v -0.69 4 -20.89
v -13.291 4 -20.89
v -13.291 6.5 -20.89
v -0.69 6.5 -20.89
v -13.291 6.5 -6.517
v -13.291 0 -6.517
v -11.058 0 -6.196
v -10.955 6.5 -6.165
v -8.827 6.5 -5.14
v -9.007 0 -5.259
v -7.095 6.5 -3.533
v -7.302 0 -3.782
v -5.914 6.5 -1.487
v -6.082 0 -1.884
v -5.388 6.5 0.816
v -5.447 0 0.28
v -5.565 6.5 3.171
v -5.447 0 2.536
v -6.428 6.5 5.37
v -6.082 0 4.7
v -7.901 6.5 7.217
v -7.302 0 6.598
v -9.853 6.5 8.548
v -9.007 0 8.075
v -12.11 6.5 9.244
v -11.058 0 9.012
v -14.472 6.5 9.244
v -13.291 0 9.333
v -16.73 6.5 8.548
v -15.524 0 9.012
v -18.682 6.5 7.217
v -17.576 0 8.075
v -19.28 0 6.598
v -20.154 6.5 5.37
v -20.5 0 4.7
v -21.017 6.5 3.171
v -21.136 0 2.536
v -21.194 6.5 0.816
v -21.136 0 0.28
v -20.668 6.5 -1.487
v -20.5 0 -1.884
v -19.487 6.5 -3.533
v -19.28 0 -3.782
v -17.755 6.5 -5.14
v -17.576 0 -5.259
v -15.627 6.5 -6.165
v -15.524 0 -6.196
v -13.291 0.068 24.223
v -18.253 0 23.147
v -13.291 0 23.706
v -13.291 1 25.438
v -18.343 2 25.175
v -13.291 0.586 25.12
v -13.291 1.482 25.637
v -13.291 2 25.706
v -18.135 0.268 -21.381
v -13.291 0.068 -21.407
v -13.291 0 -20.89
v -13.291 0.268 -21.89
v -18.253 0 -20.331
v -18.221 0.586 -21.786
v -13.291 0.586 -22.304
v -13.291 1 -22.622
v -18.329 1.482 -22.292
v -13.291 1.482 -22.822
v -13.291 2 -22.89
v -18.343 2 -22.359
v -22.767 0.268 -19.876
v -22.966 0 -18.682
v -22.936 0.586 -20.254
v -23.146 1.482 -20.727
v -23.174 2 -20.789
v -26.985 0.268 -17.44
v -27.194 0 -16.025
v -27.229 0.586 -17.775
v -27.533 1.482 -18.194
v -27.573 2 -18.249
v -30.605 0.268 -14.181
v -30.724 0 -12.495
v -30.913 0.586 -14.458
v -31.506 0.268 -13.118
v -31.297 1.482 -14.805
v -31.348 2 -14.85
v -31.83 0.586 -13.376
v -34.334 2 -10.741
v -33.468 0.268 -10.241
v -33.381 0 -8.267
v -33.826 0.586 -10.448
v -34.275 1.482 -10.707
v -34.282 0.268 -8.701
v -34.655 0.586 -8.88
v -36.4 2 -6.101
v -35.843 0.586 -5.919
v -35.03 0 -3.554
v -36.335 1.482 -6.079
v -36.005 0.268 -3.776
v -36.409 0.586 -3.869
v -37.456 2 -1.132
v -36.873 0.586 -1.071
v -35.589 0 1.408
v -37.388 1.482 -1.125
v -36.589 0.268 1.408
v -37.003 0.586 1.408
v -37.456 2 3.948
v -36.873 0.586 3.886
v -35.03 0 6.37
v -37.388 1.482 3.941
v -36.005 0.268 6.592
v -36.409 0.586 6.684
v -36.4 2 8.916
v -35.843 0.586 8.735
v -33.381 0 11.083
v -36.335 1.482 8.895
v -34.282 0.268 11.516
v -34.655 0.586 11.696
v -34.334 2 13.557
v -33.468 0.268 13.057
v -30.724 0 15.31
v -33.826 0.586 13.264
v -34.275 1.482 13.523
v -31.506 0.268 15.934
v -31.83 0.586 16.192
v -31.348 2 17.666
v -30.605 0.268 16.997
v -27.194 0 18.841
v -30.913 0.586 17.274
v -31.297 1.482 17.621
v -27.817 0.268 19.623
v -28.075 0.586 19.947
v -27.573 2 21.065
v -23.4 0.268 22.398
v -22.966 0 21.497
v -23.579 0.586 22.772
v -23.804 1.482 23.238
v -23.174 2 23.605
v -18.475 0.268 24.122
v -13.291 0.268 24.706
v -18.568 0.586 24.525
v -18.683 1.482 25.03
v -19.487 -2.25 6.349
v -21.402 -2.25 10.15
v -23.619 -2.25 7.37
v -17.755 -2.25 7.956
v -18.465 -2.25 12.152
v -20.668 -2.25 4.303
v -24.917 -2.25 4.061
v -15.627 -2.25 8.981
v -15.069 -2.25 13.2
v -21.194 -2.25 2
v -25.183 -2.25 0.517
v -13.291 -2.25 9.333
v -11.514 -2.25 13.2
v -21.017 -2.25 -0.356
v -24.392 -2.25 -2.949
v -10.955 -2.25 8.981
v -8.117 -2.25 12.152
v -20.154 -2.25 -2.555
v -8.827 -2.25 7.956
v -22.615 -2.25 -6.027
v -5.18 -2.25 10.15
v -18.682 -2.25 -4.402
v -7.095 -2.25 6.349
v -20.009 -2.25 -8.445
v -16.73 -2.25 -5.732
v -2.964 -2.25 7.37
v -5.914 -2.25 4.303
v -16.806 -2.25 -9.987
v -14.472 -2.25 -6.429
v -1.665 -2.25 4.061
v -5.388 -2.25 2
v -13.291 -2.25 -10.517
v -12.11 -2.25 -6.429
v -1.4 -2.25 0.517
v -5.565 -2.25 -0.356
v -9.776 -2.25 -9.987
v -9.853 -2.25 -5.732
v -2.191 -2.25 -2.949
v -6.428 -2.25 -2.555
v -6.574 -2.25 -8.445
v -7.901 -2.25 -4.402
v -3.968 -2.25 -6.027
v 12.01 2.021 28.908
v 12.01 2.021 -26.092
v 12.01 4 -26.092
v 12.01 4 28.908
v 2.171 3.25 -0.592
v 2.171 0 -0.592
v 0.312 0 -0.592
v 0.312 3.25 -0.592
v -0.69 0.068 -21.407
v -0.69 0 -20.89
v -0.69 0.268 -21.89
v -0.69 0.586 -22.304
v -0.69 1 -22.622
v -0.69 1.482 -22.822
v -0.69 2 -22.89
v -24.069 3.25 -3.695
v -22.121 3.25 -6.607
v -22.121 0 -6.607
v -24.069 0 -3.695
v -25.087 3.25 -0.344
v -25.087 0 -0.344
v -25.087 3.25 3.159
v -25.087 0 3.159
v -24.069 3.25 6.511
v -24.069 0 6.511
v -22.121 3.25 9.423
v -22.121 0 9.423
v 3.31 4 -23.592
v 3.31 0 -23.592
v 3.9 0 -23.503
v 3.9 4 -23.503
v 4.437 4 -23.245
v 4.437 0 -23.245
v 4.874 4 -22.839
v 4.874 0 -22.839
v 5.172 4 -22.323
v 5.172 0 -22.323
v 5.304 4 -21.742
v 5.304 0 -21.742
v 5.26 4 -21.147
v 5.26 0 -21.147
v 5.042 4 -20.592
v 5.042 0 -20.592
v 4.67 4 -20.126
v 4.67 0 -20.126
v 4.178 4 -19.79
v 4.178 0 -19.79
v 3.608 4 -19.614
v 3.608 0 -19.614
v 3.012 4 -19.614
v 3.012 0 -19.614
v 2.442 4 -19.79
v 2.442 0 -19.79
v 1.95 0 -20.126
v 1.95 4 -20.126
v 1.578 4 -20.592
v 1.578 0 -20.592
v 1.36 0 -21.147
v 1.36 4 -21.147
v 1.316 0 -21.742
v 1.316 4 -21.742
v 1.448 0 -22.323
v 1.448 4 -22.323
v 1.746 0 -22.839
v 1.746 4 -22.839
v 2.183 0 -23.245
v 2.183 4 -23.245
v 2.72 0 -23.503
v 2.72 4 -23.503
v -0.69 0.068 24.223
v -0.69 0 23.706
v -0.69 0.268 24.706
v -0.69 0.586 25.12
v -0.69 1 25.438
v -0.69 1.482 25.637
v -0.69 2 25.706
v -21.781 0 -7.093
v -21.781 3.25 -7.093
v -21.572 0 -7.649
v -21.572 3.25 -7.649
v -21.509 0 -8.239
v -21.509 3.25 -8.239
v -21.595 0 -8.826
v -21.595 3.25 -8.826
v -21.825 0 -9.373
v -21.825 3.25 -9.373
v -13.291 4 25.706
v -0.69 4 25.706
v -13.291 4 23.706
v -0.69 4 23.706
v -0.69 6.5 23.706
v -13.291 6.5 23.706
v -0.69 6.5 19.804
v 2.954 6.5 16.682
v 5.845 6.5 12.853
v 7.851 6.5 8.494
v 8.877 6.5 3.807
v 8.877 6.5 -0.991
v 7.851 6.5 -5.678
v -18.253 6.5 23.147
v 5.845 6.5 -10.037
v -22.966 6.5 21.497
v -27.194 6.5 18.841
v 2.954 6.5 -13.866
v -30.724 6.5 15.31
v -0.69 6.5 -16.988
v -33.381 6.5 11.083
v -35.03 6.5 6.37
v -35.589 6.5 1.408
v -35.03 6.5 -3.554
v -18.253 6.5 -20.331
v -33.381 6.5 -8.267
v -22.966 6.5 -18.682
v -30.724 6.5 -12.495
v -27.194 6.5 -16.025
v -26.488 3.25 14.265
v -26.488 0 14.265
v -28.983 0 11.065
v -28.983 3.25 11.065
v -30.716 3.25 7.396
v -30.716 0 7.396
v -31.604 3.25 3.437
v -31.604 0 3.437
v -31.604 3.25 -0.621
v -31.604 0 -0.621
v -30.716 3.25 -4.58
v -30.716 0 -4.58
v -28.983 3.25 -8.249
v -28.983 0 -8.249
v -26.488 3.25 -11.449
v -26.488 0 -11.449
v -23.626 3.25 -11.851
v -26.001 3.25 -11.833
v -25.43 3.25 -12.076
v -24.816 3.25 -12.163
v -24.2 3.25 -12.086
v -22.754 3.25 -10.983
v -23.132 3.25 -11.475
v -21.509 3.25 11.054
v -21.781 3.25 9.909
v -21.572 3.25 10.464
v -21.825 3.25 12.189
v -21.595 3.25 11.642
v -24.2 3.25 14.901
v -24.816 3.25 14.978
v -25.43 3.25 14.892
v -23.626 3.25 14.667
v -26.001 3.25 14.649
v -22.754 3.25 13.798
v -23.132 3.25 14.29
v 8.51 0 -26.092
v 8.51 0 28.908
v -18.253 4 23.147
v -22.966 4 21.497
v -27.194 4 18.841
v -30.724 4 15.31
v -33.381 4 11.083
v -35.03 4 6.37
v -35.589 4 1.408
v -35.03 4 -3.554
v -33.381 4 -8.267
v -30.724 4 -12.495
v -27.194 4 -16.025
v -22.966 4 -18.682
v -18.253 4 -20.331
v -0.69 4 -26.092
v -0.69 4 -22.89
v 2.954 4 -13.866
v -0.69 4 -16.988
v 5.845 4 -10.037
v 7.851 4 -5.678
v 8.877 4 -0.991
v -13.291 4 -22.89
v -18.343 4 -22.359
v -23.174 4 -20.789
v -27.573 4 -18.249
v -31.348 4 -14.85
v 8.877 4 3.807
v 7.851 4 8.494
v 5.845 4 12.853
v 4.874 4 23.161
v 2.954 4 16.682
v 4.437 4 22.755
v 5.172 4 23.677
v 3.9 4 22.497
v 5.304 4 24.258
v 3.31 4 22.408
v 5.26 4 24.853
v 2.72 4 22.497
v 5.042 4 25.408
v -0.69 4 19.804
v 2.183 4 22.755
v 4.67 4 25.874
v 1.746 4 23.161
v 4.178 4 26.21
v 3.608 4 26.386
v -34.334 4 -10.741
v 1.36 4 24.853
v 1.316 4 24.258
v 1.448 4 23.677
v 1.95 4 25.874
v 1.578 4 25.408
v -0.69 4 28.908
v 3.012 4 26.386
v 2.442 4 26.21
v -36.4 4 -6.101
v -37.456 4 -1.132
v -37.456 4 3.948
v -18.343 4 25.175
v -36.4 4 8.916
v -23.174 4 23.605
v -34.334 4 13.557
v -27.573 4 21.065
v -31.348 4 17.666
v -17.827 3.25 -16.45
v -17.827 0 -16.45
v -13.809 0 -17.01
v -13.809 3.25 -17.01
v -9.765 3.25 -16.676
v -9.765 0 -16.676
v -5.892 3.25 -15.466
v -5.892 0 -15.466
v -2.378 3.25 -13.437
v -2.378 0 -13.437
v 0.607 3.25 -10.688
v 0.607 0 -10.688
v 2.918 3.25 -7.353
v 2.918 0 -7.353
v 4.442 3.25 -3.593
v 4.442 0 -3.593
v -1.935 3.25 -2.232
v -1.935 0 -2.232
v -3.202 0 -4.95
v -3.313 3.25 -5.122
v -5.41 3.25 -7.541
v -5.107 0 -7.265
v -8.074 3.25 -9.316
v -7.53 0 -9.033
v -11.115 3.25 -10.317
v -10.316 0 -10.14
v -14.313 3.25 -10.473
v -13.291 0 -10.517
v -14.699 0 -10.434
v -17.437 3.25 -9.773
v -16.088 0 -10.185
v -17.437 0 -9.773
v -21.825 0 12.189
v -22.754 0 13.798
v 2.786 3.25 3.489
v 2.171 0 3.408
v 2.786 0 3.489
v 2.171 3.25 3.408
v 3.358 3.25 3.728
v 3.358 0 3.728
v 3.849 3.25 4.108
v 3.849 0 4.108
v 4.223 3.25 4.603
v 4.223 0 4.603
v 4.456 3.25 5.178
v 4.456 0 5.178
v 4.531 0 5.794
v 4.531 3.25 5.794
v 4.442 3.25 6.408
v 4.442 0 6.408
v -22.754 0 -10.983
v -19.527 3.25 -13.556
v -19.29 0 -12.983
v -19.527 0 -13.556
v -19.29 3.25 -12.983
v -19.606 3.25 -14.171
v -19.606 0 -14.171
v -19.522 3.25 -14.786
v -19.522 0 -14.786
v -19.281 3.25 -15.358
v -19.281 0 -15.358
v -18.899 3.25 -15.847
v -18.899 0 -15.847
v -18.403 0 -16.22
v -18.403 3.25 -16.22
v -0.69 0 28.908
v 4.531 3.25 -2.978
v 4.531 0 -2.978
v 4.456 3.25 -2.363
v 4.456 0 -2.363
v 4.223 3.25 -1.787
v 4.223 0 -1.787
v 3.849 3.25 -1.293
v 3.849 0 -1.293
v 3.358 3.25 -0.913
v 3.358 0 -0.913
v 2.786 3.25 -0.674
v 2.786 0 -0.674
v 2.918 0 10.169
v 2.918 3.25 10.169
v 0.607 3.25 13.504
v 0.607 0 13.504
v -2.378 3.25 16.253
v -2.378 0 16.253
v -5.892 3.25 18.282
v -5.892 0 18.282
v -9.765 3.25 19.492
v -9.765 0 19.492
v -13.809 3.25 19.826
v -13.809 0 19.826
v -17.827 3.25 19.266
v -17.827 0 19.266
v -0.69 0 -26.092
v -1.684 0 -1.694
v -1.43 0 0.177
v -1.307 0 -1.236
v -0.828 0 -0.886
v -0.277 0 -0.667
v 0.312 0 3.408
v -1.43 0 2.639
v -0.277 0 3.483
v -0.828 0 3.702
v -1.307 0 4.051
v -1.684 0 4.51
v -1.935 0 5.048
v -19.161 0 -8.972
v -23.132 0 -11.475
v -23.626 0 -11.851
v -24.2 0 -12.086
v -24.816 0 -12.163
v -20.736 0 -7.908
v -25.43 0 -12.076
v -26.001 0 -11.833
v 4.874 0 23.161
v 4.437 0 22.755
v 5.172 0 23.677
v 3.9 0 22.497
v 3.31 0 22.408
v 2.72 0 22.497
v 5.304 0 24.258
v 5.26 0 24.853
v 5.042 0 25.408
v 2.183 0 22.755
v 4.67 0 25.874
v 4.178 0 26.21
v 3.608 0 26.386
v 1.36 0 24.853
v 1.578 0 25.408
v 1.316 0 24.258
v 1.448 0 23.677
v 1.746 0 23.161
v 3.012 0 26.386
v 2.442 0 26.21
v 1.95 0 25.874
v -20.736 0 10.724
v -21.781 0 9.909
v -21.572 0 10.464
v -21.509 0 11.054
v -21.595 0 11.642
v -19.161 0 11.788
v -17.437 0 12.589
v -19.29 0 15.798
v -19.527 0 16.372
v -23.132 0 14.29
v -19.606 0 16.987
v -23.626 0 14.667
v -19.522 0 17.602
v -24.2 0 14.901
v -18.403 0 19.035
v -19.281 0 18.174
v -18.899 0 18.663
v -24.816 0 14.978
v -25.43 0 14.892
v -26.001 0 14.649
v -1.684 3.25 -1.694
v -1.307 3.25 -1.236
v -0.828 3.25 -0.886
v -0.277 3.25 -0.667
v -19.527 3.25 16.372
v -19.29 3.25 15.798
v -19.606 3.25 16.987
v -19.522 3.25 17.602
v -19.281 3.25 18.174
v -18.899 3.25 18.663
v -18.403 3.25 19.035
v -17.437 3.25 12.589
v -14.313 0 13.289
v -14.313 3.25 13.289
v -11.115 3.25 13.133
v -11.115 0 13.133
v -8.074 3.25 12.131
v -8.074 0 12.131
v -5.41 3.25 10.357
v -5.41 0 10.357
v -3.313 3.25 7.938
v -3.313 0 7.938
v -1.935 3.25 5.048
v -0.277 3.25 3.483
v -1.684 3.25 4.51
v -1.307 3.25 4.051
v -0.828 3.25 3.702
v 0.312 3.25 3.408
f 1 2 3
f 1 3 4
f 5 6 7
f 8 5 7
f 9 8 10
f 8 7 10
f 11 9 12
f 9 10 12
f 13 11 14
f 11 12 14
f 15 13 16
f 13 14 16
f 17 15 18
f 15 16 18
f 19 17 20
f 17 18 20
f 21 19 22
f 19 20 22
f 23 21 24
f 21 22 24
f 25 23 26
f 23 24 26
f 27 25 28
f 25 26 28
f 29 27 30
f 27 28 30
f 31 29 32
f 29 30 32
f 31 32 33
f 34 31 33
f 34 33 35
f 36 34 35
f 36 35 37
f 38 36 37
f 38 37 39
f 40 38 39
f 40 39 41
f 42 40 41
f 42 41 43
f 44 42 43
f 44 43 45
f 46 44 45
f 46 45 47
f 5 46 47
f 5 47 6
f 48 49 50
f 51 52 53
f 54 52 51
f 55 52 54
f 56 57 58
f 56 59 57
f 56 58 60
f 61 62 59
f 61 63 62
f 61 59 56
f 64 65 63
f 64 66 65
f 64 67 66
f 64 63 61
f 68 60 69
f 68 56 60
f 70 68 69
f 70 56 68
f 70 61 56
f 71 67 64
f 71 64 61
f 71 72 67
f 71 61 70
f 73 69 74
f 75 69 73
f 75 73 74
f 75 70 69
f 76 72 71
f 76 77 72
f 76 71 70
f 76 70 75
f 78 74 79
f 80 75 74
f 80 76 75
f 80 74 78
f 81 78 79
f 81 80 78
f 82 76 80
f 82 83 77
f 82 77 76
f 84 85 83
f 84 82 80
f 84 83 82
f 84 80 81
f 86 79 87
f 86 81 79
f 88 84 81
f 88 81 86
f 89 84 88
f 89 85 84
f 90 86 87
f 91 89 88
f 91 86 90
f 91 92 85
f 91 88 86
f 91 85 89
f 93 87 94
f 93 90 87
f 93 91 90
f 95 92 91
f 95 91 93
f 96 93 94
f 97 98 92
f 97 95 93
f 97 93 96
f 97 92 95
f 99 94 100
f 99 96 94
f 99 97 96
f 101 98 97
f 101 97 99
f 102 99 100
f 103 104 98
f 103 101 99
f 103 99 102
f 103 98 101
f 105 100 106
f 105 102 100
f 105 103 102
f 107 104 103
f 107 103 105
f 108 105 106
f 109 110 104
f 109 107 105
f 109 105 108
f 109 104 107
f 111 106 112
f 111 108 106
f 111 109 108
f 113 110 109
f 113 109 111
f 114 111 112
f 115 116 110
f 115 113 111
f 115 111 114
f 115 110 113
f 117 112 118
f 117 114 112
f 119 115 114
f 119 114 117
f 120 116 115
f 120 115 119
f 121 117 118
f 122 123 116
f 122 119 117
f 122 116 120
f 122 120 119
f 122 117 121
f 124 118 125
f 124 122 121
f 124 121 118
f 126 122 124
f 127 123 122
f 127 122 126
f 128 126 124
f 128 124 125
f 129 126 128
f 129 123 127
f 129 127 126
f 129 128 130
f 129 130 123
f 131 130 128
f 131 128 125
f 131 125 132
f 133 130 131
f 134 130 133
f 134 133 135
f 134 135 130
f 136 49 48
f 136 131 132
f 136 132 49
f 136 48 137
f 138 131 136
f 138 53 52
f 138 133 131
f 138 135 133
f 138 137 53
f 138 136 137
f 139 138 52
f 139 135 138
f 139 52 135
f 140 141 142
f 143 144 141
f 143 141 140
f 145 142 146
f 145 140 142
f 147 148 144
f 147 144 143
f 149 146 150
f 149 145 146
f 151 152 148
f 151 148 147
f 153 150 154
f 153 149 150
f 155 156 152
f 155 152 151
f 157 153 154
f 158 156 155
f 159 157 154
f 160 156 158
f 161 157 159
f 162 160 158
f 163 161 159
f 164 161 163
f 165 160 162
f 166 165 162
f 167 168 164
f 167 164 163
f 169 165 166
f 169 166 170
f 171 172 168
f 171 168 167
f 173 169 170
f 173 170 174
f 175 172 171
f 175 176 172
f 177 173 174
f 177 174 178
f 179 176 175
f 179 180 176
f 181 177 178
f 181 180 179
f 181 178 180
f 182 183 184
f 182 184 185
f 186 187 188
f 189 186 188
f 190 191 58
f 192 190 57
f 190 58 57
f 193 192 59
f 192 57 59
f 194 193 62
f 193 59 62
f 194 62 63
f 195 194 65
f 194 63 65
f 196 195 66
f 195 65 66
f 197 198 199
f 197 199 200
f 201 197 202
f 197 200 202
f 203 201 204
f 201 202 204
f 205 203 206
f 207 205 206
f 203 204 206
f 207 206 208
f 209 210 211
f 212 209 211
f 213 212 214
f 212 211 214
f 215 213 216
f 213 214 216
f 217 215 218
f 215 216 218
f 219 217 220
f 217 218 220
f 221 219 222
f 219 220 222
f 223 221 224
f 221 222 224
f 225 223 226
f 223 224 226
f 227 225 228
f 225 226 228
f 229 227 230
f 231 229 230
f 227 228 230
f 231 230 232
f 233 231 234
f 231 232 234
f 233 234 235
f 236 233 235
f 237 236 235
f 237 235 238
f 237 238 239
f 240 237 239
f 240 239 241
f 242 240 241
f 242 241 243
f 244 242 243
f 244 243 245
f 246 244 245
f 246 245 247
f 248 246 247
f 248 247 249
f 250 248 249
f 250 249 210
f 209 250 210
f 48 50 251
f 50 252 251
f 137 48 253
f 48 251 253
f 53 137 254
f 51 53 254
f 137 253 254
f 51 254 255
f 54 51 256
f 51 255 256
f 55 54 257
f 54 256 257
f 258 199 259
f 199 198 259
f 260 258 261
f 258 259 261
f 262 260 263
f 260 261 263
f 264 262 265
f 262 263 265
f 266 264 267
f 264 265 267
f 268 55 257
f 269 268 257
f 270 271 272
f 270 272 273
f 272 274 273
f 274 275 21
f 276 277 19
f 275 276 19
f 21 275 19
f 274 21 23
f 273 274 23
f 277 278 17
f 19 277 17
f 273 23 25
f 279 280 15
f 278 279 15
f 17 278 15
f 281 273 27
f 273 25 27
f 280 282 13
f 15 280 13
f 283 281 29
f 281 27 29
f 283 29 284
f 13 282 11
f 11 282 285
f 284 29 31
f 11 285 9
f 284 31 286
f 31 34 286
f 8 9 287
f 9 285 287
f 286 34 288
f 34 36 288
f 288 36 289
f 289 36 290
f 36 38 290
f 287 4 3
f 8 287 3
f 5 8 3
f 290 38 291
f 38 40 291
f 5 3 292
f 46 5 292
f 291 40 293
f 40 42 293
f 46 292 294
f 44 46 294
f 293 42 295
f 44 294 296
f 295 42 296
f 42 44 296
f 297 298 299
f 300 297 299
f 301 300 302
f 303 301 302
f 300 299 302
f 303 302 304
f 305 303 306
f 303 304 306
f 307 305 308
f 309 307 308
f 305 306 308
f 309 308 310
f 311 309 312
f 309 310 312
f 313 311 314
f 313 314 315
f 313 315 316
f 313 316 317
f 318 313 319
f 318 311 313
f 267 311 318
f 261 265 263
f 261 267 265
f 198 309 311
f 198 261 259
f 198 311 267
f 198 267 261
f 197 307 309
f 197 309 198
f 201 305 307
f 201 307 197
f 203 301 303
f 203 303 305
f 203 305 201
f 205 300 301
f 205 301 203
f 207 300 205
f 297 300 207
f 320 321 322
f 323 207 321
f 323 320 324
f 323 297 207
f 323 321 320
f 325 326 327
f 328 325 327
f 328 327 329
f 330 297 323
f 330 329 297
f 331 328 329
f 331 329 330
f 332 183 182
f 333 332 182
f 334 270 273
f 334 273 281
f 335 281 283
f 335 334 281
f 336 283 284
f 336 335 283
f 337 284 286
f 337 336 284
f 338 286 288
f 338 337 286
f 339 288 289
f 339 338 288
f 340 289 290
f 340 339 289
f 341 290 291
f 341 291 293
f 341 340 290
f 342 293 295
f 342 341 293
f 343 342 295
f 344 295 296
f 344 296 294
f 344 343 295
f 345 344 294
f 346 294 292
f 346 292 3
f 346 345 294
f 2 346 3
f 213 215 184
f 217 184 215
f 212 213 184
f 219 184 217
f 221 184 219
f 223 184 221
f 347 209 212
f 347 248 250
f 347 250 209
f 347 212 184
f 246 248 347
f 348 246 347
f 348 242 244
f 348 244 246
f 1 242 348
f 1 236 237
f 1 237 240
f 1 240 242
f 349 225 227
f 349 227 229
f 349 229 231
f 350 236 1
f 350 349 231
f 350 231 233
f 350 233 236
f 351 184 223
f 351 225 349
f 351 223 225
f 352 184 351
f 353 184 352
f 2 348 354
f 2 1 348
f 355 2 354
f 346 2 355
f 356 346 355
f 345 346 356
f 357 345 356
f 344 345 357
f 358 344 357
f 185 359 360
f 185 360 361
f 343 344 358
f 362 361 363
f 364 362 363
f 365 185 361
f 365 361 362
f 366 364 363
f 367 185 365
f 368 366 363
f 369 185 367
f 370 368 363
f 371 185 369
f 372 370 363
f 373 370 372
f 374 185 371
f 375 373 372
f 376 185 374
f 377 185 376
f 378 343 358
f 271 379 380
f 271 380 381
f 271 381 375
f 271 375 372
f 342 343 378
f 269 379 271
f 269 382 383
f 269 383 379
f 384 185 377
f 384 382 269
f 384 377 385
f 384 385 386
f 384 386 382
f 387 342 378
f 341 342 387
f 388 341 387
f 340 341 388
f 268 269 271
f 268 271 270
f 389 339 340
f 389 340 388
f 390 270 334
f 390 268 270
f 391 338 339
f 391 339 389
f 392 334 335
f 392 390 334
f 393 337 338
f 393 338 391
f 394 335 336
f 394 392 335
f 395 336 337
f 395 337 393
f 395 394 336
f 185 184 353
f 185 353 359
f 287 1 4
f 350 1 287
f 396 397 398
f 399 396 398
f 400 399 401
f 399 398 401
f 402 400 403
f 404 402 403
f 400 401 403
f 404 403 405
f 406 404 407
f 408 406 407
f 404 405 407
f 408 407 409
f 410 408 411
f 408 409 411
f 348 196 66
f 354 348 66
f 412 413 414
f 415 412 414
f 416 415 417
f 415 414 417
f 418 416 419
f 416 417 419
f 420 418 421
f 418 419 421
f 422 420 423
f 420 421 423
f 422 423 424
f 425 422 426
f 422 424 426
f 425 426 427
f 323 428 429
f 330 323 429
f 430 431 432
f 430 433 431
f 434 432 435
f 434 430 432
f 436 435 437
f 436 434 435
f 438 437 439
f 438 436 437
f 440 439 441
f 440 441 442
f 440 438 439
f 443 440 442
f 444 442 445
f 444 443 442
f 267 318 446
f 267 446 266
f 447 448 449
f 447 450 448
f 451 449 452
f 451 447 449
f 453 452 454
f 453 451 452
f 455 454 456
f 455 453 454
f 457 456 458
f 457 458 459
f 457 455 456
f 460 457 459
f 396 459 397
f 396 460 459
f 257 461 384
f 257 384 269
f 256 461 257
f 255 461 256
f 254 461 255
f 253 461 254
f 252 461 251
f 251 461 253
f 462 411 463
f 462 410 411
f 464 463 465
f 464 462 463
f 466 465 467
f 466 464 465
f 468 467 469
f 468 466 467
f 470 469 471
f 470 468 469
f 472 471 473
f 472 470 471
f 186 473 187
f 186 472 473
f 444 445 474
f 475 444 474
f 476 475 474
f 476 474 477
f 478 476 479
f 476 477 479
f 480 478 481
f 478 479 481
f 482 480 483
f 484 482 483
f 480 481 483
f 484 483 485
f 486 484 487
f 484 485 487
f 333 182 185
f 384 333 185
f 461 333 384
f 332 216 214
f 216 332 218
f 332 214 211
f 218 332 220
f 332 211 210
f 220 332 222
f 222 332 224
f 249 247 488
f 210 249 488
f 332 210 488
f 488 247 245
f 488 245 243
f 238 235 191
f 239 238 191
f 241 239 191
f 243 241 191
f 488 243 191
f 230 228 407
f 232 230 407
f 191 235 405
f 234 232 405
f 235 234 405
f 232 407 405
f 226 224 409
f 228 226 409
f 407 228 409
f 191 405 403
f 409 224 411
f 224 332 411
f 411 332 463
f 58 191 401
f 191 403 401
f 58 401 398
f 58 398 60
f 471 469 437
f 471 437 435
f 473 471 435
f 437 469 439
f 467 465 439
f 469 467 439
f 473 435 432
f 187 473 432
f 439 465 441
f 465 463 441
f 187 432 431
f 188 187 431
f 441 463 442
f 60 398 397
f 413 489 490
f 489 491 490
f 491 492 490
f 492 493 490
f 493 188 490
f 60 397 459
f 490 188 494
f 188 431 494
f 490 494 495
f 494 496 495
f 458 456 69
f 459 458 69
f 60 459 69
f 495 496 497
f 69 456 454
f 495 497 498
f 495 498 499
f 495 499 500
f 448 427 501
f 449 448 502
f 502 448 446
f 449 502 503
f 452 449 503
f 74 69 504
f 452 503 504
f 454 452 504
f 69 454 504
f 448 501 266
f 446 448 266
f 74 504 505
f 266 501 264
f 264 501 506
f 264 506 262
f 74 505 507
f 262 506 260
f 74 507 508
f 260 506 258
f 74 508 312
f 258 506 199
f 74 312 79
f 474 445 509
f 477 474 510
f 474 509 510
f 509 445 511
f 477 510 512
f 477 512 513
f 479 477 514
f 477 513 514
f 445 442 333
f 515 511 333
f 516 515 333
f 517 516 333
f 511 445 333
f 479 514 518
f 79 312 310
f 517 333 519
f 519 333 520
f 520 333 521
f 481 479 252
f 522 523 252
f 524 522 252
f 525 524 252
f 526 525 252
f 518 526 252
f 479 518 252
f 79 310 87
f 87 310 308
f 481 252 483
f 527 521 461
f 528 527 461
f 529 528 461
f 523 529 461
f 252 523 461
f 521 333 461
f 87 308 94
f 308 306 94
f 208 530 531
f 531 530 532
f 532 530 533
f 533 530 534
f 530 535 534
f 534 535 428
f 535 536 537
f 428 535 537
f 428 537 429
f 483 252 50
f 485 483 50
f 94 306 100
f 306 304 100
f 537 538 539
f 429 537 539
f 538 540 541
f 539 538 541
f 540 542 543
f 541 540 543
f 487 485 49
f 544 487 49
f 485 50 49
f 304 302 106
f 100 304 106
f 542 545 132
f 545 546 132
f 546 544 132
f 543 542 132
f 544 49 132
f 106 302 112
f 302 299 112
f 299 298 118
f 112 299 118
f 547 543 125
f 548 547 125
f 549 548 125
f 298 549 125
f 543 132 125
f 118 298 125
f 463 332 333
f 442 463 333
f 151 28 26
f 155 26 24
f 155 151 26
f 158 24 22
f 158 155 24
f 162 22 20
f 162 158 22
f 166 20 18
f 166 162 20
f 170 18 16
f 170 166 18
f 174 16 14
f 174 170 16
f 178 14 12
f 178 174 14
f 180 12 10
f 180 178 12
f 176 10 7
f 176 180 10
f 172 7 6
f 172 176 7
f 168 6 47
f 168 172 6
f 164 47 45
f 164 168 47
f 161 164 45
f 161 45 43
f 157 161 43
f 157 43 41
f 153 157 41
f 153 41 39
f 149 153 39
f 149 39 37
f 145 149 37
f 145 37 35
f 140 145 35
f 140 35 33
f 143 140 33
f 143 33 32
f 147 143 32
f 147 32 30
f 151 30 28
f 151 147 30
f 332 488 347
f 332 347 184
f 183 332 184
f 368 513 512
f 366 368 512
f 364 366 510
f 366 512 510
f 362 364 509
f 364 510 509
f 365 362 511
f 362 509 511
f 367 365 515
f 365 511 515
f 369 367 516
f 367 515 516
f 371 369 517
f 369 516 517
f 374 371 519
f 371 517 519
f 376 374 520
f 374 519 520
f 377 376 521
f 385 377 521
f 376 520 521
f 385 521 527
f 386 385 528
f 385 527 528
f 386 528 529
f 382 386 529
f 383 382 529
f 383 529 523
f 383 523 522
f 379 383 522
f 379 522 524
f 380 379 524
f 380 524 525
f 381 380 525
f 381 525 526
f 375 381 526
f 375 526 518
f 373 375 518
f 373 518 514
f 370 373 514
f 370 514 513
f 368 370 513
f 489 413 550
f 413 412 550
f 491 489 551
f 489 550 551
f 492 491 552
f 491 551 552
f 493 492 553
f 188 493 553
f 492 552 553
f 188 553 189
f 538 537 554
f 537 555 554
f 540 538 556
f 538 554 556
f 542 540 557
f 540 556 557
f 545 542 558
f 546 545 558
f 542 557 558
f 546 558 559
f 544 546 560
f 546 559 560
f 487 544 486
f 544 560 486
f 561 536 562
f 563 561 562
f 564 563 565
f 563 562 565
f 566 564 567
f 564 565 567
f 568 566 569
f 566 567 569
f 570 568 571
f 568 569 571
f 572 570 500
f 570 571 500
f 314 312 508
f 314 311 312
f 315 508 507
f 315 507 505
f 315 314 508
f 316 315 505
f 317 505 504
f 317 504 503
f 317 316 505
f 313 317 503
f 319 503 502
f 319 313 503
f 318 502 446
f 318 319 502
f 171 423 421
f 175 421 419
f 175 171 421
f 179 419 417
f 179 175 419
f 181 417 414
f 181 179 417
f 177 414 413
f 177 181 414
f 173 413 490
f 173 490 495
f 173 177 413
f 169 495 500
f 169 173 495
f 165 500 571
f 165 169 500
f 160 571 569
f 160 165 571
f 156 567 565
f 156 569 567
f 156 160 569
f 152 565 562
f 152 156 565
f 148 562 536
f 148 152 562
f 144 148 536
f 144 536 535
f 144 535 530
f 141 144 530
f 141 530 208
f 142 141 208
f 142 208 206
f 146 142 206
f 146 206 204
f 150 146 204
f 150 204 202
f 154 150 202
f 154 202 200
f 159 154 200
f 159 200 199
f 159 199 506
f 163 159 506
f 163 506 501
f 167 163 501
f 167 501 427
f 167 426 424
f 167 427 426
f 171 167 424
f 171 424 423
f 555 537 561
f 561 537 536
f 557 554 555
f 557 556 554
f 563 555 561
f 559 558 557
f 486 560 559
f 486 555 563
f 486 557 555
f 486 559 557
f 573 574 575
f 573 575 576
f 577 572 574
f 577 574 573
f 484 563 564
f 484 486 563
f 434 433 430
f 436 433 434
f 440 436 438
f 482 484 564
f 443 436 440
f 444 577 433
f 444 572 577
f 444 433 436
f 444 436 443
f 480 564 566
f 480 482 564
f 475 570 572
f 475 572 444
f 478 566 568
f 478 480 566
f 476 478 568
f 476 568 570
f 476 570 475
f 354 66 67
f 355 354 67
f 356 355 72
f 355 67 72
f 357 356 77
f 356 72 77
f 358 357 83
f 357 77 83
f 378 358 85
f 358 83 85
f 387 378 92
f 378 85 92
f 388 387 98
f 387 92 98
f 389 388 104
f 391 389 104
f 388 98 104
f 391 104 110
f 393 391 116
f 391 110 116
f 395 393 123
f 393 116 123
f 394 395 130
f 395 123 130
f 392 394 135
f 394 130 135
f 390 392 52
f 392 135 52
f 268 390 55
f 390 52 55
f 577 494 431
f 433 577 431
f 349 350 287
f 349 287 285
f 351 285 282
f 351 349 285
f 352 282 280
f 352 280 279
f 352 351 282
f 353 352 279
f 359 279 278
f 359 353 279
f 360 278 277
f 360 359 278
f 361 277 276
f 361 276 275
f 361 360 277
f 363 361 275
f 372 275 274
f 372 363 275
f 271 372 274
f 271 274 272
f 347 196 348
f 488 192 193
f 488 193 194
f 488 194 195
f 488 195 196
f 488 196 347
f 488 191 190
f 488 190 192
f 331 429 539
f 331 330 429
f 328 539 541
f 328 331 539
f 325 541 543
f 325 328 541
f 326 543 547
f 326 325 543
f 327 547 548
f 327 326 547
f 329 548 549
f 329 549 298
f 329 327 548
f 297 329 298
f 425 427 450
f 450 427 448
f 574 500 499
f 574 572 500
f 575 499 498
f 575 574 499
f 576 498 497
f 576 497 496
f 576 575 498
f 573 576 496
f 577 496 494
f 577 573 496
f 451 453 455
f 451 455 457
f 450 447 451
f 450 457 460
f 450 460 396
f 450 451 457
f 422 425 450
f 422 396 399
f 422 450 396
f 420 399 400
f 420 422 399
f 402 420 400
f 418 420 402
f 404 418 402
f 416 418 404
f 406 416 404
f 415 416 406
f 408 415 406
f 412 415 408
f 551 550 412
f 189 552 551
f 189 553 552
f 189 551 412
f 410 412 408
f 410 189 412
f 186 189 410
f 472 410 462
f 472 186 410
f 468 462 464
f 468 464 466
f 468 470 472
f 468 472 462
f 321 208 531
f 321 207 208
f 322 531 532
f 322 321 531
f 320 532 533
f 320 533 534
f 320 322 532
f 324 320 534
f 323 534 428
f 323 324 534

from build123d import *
from build123d.topology import SkipClean

# Parameters (mm, degrees)
BOSS_EXTRUDE1_DEPTH = 4
BOSS_EXTRUDE2_DEPTH = 2.5
SKETCH3_R           = 7.925
CUT_EXTRUDE1_DEPTH  = 9.25
SKETCH4_R           = 2
CUT_EXTRUDE2_DEPTH  = 9.25
CUT_EXTRUDE3_DEPTH  = 3.25
FILLET1_R           = 2.36
CHAMFER1_SIZE       = 3.5
CHAMFER1_SIZE2      = 2.020725942
BOSS_EXTRUDE4_DEPTH = 4
FILLET4_R           = 2
BOSS_EXTRUDE5_START = 2.25
SKETCH11_R          = 11.925
BOSS_EXTRUDE5_DEPTH = 2.25
CUT_EXTRUDE4_START  = -2.25
SKETCH12_R          = 7.925
CUT_EXTRUDE4_DEPTH  = 2.25


with BuildPart() as part:
    # Sketch1 → Boss-Extrude1 (new body)
    with BuildSketch(Plane(origin=(0, 0, 0), x_dir=(1, 0, 0), z_dir=(0, 1, 0))):
        with BuildLine():
            Line((-13.29118379, 20.889836125), (-0.68999579, 20.889836125))
            Line((-0.68999579, 20.889836125), (-0.68999579, 26.09210312))
            Line((-0.68999579, 26.09210312), (12.01000421, 26.09210312))
            Line((12.01000421, 26.09210312), (12.01000421, -28.90789688))
            Line((12.01000421, -28.90789688), (-0.68999579, -28.90789688))
            Line((-0.68999579, -28.90789688), (-0.68999579, -23.705629885))
            Line((-0.68999579, -23.705629885), (-13.29118379, -23.705629885))
            ThreePointArc((-13.29118379, -23.705629885), (-35.588916795, -1.40789688), (-13.29118379, 20.889836125))
        make_face()
    extrude(amount=BOSS_EXTRUDE1_DEPTH)

    # Sketch2 → Boss-Extrude2 (add)
    with BuildSketch(Plane(origin=(0, 4, 0), x_dir=(1, 0, 0), z_dir=(0, 1, 0))):
        with BuildLine():
            Line((-13.29118379, 20.889836125), (-0.68999579, 20.889836125))
            Line((-0.68999579, 20.889836125), (-0.68999579, 16.987726462))
            ThreePointArc((-0.68999579, 16.987726462), (9.006549215, -1.40789688), (-0.68999579, -19.803520222))
            Line((-0.68999579, -19.803520222), (-0.68999579, -23.705629885))
            Line((-0.68999579, -23.705629885), (-13.29118379, -23.705629885))
            ThreePointArc((-13.29118379, -23.705629885), (-35.588916795, -1.40789688), (-13.29118379, 20.889836125))
        make_face()
    extrude(amount=BOSS_EXTRUDE2_DEPTH)

    # Sketch3 → Cut-Extrude1 (cut)
    with BuildSketch(Plane.XZ):
        with Locations(Location((-13.29118379, 1.40789688, 0), (0, 0, 270))):
            Circle(SKETCH3_R)
    extrude(amount=-CUT_EXTRUDE1_DEPTH, mode=Mode.SUBTRACT)

    # Sketch4 → Cut-Extrude2 (cut)
    with BuildSketch(Plane.XZ):
        with Locations(Location((3.31000421, 24.40789688, 0), (0, 0, 270))):
            Circle(SKETCH4_R)
        with Locations(Location((3.310004206, -21.59210312, 0), (0, 0, 270))):
            Circle(SKETCH4_R)
    extrude(amount=-CUT_EXTRUDE2_DEPTH, mode=Mode.SUBTRACT)

    # Sketch5 → Cut-Extrude3 (cut)
    with BuildSketch(Plane.XZ):
        with BuildLine():
            ThreePointArc((-20.901279021, -7.773174712), (-25.21618379, 1.40789688), (-20.901279021, 10.588968471))
            Line((-20.901279021, 10.588968471), (-24.18129969, 16.27013092))
            ThreePointArc((-24.18129969, 16.27013092), (-31.71618379, 1.40789688), (-24.18129969, -13.454337161))
            Line((-24.18129969, -13.454337161), (-20.901279021, -7.773174712))
        make_face()
        with BuildLine():
            Line((-20.717198075, 18.27013092), (-17.437177406, 12.588968471))
            ThreePointArc((-17.437177406, 12.588968471), (-7.32868379, 11.73524982), (-1.535094942, 3.40789688))
            Line((-1.535094942, 3.40789688), (5.024946397, 3.40789688))
            ThreePointArc((5.024946397, 3.40789688), (-4.07868379, 17.364414944), (-20.717198075, 18.27013092))
        make_face()
        with BuildLine():
            ThreePointArc((-1.535094942, -0.59210312), (-7.32868379, -8.91945606), (-17.437177406, -9.773174712))
            Line((-17.437177406, -9.773174712), (-20.717198075, -15.454337161))
            ThreePointArc((-20.717198075, -15.454337161), (-4.07868379, -14.548621185), (5.024946397, -0.59210312))
            Line((5.024946397, -0.59210312), (-1.535094942, -0.59210312))
        make_face()
    extrude(amount=-CUT_EXTRUDE3_DEPTH, mode=Mode.SUBTRACT)

    # Fillet1
    fillet1_edges = [part.edges().sort_by_distance(p)[0] for p in [
        (-20.901279021, 1.625, 10.588968471),
        (-20.901279021, 1.625, -7.773174712),
        (-24.18129969, 1.625, -13.454337161),
        (-24.18129969, 1.625, 16.27013092),
        (5.024946397, 1.625, 3.40789688),
        (-1.535094942, 1.625, 3.40789688),
        (-20.717198075, 1.625, 18.27013092),
        (-1.535094942, 1.625, -0.59210312),
        (5.024946397, 1.625, -0.59210312),
        (-20.717198075, 1.625, -15.454337161),
    ]]
    fillet(fillet1_edges, radius=FILLET1_R)

    # Chamfer1
    chamfer1_edges = [part.edges().sort_by_distance(p)[0] for p in [
        (12.01000421, 0, 1.40789688),
    ]]
    chamfer1_side = [part.faces().sort_by_distance(p)[0] for p in [
        (-3.714999267, 0, 17.994335016),
    ]]
    chamfer(chamfer1_edges, length=CHAMFER1_SIZE, length2=CHAMFER1_SIZE2, reference=chamfer1_side[0])

    # Sketch10 → Boss-Extrude4 (add)
    with BuildSketch(Plane.XZ):
        with BuildLine():
            Line((-0.68999579, -22.889836125), (-13.29118379, -22.889836125))
            ThreePointArc((-13.29118379, -22.889836125), (-37.588916795, 1.40789688), (-13.29118379, 25.705629885))
            Line((-13.29118379, 25.705629885), (-0.68999579, 25.705629885))
            Line((-0.68999579, 25.705629885), (-0.68999579, 23.705629885))
            Line((-0.68999579, 23.705629885), (-13.29118379, 23.705629885))
            ThreePointArc((-13.29118379, 23.705629885), (-35.588916795, 1.40789688), (-13.29118379, -20.889836125))
            Line((-13.29118379, -20.889836125), (-0.68999579, -20.889836125))
            Line((-0.68999579, -20.889836125), (-0.68999579, -22.889836125))
        make_face()
    extrude(amount=-BOSS_EXTRUDE4_DEPTH)

    # Fillet4
    fillet4_edges = [part.edges().sort_by_distance(p)[0] for p in [
        (-6.99058979, 0, 25.705629885),
        (-37.588916795, 0, 1.40789688),
        (-6.99058979, 0, -22.889836125),
    ]]
    fillet(fillet4_edges, radius=FILLET4_R)

    # Sketch11 → Boss-Extrude5 (add)
    with SkipClean():  # the faces are left unmerged after this step: merging them gives an invalid solid
        with BuildSketch(Plane.XZ.offset(BOSS_EXTRUDE5_START)):
            with Locations(Location((-13.29118379, 1.40789688, 0), (0, 0, 270))):
                Circle(SKETCH11_R)
        extrude(amount=-BOSS_EXTRUDE5_DEPTH)

    # Sketch12 → Cut-Extrude4 (cut)
    with SkipClean():  # the faces are left unmerged after this step: merging them gives an invalid solid
        with BuildSketch(Plane(origin=(0, 0, 0), x_dir=(1, 0, 0), z_dir=(0, 1, 0)).offset(CUT_EXTRUDE4_START)):
            with Locations(Location((-13.29118379, -1.40789688, 0), (0, 0, 270))):
                Circle(SKETCH12_R)
        extrude(amount=CUT_EXTRUDE4_DEPTH, mode=Mode.SUBTRACT)


solid = part.part
